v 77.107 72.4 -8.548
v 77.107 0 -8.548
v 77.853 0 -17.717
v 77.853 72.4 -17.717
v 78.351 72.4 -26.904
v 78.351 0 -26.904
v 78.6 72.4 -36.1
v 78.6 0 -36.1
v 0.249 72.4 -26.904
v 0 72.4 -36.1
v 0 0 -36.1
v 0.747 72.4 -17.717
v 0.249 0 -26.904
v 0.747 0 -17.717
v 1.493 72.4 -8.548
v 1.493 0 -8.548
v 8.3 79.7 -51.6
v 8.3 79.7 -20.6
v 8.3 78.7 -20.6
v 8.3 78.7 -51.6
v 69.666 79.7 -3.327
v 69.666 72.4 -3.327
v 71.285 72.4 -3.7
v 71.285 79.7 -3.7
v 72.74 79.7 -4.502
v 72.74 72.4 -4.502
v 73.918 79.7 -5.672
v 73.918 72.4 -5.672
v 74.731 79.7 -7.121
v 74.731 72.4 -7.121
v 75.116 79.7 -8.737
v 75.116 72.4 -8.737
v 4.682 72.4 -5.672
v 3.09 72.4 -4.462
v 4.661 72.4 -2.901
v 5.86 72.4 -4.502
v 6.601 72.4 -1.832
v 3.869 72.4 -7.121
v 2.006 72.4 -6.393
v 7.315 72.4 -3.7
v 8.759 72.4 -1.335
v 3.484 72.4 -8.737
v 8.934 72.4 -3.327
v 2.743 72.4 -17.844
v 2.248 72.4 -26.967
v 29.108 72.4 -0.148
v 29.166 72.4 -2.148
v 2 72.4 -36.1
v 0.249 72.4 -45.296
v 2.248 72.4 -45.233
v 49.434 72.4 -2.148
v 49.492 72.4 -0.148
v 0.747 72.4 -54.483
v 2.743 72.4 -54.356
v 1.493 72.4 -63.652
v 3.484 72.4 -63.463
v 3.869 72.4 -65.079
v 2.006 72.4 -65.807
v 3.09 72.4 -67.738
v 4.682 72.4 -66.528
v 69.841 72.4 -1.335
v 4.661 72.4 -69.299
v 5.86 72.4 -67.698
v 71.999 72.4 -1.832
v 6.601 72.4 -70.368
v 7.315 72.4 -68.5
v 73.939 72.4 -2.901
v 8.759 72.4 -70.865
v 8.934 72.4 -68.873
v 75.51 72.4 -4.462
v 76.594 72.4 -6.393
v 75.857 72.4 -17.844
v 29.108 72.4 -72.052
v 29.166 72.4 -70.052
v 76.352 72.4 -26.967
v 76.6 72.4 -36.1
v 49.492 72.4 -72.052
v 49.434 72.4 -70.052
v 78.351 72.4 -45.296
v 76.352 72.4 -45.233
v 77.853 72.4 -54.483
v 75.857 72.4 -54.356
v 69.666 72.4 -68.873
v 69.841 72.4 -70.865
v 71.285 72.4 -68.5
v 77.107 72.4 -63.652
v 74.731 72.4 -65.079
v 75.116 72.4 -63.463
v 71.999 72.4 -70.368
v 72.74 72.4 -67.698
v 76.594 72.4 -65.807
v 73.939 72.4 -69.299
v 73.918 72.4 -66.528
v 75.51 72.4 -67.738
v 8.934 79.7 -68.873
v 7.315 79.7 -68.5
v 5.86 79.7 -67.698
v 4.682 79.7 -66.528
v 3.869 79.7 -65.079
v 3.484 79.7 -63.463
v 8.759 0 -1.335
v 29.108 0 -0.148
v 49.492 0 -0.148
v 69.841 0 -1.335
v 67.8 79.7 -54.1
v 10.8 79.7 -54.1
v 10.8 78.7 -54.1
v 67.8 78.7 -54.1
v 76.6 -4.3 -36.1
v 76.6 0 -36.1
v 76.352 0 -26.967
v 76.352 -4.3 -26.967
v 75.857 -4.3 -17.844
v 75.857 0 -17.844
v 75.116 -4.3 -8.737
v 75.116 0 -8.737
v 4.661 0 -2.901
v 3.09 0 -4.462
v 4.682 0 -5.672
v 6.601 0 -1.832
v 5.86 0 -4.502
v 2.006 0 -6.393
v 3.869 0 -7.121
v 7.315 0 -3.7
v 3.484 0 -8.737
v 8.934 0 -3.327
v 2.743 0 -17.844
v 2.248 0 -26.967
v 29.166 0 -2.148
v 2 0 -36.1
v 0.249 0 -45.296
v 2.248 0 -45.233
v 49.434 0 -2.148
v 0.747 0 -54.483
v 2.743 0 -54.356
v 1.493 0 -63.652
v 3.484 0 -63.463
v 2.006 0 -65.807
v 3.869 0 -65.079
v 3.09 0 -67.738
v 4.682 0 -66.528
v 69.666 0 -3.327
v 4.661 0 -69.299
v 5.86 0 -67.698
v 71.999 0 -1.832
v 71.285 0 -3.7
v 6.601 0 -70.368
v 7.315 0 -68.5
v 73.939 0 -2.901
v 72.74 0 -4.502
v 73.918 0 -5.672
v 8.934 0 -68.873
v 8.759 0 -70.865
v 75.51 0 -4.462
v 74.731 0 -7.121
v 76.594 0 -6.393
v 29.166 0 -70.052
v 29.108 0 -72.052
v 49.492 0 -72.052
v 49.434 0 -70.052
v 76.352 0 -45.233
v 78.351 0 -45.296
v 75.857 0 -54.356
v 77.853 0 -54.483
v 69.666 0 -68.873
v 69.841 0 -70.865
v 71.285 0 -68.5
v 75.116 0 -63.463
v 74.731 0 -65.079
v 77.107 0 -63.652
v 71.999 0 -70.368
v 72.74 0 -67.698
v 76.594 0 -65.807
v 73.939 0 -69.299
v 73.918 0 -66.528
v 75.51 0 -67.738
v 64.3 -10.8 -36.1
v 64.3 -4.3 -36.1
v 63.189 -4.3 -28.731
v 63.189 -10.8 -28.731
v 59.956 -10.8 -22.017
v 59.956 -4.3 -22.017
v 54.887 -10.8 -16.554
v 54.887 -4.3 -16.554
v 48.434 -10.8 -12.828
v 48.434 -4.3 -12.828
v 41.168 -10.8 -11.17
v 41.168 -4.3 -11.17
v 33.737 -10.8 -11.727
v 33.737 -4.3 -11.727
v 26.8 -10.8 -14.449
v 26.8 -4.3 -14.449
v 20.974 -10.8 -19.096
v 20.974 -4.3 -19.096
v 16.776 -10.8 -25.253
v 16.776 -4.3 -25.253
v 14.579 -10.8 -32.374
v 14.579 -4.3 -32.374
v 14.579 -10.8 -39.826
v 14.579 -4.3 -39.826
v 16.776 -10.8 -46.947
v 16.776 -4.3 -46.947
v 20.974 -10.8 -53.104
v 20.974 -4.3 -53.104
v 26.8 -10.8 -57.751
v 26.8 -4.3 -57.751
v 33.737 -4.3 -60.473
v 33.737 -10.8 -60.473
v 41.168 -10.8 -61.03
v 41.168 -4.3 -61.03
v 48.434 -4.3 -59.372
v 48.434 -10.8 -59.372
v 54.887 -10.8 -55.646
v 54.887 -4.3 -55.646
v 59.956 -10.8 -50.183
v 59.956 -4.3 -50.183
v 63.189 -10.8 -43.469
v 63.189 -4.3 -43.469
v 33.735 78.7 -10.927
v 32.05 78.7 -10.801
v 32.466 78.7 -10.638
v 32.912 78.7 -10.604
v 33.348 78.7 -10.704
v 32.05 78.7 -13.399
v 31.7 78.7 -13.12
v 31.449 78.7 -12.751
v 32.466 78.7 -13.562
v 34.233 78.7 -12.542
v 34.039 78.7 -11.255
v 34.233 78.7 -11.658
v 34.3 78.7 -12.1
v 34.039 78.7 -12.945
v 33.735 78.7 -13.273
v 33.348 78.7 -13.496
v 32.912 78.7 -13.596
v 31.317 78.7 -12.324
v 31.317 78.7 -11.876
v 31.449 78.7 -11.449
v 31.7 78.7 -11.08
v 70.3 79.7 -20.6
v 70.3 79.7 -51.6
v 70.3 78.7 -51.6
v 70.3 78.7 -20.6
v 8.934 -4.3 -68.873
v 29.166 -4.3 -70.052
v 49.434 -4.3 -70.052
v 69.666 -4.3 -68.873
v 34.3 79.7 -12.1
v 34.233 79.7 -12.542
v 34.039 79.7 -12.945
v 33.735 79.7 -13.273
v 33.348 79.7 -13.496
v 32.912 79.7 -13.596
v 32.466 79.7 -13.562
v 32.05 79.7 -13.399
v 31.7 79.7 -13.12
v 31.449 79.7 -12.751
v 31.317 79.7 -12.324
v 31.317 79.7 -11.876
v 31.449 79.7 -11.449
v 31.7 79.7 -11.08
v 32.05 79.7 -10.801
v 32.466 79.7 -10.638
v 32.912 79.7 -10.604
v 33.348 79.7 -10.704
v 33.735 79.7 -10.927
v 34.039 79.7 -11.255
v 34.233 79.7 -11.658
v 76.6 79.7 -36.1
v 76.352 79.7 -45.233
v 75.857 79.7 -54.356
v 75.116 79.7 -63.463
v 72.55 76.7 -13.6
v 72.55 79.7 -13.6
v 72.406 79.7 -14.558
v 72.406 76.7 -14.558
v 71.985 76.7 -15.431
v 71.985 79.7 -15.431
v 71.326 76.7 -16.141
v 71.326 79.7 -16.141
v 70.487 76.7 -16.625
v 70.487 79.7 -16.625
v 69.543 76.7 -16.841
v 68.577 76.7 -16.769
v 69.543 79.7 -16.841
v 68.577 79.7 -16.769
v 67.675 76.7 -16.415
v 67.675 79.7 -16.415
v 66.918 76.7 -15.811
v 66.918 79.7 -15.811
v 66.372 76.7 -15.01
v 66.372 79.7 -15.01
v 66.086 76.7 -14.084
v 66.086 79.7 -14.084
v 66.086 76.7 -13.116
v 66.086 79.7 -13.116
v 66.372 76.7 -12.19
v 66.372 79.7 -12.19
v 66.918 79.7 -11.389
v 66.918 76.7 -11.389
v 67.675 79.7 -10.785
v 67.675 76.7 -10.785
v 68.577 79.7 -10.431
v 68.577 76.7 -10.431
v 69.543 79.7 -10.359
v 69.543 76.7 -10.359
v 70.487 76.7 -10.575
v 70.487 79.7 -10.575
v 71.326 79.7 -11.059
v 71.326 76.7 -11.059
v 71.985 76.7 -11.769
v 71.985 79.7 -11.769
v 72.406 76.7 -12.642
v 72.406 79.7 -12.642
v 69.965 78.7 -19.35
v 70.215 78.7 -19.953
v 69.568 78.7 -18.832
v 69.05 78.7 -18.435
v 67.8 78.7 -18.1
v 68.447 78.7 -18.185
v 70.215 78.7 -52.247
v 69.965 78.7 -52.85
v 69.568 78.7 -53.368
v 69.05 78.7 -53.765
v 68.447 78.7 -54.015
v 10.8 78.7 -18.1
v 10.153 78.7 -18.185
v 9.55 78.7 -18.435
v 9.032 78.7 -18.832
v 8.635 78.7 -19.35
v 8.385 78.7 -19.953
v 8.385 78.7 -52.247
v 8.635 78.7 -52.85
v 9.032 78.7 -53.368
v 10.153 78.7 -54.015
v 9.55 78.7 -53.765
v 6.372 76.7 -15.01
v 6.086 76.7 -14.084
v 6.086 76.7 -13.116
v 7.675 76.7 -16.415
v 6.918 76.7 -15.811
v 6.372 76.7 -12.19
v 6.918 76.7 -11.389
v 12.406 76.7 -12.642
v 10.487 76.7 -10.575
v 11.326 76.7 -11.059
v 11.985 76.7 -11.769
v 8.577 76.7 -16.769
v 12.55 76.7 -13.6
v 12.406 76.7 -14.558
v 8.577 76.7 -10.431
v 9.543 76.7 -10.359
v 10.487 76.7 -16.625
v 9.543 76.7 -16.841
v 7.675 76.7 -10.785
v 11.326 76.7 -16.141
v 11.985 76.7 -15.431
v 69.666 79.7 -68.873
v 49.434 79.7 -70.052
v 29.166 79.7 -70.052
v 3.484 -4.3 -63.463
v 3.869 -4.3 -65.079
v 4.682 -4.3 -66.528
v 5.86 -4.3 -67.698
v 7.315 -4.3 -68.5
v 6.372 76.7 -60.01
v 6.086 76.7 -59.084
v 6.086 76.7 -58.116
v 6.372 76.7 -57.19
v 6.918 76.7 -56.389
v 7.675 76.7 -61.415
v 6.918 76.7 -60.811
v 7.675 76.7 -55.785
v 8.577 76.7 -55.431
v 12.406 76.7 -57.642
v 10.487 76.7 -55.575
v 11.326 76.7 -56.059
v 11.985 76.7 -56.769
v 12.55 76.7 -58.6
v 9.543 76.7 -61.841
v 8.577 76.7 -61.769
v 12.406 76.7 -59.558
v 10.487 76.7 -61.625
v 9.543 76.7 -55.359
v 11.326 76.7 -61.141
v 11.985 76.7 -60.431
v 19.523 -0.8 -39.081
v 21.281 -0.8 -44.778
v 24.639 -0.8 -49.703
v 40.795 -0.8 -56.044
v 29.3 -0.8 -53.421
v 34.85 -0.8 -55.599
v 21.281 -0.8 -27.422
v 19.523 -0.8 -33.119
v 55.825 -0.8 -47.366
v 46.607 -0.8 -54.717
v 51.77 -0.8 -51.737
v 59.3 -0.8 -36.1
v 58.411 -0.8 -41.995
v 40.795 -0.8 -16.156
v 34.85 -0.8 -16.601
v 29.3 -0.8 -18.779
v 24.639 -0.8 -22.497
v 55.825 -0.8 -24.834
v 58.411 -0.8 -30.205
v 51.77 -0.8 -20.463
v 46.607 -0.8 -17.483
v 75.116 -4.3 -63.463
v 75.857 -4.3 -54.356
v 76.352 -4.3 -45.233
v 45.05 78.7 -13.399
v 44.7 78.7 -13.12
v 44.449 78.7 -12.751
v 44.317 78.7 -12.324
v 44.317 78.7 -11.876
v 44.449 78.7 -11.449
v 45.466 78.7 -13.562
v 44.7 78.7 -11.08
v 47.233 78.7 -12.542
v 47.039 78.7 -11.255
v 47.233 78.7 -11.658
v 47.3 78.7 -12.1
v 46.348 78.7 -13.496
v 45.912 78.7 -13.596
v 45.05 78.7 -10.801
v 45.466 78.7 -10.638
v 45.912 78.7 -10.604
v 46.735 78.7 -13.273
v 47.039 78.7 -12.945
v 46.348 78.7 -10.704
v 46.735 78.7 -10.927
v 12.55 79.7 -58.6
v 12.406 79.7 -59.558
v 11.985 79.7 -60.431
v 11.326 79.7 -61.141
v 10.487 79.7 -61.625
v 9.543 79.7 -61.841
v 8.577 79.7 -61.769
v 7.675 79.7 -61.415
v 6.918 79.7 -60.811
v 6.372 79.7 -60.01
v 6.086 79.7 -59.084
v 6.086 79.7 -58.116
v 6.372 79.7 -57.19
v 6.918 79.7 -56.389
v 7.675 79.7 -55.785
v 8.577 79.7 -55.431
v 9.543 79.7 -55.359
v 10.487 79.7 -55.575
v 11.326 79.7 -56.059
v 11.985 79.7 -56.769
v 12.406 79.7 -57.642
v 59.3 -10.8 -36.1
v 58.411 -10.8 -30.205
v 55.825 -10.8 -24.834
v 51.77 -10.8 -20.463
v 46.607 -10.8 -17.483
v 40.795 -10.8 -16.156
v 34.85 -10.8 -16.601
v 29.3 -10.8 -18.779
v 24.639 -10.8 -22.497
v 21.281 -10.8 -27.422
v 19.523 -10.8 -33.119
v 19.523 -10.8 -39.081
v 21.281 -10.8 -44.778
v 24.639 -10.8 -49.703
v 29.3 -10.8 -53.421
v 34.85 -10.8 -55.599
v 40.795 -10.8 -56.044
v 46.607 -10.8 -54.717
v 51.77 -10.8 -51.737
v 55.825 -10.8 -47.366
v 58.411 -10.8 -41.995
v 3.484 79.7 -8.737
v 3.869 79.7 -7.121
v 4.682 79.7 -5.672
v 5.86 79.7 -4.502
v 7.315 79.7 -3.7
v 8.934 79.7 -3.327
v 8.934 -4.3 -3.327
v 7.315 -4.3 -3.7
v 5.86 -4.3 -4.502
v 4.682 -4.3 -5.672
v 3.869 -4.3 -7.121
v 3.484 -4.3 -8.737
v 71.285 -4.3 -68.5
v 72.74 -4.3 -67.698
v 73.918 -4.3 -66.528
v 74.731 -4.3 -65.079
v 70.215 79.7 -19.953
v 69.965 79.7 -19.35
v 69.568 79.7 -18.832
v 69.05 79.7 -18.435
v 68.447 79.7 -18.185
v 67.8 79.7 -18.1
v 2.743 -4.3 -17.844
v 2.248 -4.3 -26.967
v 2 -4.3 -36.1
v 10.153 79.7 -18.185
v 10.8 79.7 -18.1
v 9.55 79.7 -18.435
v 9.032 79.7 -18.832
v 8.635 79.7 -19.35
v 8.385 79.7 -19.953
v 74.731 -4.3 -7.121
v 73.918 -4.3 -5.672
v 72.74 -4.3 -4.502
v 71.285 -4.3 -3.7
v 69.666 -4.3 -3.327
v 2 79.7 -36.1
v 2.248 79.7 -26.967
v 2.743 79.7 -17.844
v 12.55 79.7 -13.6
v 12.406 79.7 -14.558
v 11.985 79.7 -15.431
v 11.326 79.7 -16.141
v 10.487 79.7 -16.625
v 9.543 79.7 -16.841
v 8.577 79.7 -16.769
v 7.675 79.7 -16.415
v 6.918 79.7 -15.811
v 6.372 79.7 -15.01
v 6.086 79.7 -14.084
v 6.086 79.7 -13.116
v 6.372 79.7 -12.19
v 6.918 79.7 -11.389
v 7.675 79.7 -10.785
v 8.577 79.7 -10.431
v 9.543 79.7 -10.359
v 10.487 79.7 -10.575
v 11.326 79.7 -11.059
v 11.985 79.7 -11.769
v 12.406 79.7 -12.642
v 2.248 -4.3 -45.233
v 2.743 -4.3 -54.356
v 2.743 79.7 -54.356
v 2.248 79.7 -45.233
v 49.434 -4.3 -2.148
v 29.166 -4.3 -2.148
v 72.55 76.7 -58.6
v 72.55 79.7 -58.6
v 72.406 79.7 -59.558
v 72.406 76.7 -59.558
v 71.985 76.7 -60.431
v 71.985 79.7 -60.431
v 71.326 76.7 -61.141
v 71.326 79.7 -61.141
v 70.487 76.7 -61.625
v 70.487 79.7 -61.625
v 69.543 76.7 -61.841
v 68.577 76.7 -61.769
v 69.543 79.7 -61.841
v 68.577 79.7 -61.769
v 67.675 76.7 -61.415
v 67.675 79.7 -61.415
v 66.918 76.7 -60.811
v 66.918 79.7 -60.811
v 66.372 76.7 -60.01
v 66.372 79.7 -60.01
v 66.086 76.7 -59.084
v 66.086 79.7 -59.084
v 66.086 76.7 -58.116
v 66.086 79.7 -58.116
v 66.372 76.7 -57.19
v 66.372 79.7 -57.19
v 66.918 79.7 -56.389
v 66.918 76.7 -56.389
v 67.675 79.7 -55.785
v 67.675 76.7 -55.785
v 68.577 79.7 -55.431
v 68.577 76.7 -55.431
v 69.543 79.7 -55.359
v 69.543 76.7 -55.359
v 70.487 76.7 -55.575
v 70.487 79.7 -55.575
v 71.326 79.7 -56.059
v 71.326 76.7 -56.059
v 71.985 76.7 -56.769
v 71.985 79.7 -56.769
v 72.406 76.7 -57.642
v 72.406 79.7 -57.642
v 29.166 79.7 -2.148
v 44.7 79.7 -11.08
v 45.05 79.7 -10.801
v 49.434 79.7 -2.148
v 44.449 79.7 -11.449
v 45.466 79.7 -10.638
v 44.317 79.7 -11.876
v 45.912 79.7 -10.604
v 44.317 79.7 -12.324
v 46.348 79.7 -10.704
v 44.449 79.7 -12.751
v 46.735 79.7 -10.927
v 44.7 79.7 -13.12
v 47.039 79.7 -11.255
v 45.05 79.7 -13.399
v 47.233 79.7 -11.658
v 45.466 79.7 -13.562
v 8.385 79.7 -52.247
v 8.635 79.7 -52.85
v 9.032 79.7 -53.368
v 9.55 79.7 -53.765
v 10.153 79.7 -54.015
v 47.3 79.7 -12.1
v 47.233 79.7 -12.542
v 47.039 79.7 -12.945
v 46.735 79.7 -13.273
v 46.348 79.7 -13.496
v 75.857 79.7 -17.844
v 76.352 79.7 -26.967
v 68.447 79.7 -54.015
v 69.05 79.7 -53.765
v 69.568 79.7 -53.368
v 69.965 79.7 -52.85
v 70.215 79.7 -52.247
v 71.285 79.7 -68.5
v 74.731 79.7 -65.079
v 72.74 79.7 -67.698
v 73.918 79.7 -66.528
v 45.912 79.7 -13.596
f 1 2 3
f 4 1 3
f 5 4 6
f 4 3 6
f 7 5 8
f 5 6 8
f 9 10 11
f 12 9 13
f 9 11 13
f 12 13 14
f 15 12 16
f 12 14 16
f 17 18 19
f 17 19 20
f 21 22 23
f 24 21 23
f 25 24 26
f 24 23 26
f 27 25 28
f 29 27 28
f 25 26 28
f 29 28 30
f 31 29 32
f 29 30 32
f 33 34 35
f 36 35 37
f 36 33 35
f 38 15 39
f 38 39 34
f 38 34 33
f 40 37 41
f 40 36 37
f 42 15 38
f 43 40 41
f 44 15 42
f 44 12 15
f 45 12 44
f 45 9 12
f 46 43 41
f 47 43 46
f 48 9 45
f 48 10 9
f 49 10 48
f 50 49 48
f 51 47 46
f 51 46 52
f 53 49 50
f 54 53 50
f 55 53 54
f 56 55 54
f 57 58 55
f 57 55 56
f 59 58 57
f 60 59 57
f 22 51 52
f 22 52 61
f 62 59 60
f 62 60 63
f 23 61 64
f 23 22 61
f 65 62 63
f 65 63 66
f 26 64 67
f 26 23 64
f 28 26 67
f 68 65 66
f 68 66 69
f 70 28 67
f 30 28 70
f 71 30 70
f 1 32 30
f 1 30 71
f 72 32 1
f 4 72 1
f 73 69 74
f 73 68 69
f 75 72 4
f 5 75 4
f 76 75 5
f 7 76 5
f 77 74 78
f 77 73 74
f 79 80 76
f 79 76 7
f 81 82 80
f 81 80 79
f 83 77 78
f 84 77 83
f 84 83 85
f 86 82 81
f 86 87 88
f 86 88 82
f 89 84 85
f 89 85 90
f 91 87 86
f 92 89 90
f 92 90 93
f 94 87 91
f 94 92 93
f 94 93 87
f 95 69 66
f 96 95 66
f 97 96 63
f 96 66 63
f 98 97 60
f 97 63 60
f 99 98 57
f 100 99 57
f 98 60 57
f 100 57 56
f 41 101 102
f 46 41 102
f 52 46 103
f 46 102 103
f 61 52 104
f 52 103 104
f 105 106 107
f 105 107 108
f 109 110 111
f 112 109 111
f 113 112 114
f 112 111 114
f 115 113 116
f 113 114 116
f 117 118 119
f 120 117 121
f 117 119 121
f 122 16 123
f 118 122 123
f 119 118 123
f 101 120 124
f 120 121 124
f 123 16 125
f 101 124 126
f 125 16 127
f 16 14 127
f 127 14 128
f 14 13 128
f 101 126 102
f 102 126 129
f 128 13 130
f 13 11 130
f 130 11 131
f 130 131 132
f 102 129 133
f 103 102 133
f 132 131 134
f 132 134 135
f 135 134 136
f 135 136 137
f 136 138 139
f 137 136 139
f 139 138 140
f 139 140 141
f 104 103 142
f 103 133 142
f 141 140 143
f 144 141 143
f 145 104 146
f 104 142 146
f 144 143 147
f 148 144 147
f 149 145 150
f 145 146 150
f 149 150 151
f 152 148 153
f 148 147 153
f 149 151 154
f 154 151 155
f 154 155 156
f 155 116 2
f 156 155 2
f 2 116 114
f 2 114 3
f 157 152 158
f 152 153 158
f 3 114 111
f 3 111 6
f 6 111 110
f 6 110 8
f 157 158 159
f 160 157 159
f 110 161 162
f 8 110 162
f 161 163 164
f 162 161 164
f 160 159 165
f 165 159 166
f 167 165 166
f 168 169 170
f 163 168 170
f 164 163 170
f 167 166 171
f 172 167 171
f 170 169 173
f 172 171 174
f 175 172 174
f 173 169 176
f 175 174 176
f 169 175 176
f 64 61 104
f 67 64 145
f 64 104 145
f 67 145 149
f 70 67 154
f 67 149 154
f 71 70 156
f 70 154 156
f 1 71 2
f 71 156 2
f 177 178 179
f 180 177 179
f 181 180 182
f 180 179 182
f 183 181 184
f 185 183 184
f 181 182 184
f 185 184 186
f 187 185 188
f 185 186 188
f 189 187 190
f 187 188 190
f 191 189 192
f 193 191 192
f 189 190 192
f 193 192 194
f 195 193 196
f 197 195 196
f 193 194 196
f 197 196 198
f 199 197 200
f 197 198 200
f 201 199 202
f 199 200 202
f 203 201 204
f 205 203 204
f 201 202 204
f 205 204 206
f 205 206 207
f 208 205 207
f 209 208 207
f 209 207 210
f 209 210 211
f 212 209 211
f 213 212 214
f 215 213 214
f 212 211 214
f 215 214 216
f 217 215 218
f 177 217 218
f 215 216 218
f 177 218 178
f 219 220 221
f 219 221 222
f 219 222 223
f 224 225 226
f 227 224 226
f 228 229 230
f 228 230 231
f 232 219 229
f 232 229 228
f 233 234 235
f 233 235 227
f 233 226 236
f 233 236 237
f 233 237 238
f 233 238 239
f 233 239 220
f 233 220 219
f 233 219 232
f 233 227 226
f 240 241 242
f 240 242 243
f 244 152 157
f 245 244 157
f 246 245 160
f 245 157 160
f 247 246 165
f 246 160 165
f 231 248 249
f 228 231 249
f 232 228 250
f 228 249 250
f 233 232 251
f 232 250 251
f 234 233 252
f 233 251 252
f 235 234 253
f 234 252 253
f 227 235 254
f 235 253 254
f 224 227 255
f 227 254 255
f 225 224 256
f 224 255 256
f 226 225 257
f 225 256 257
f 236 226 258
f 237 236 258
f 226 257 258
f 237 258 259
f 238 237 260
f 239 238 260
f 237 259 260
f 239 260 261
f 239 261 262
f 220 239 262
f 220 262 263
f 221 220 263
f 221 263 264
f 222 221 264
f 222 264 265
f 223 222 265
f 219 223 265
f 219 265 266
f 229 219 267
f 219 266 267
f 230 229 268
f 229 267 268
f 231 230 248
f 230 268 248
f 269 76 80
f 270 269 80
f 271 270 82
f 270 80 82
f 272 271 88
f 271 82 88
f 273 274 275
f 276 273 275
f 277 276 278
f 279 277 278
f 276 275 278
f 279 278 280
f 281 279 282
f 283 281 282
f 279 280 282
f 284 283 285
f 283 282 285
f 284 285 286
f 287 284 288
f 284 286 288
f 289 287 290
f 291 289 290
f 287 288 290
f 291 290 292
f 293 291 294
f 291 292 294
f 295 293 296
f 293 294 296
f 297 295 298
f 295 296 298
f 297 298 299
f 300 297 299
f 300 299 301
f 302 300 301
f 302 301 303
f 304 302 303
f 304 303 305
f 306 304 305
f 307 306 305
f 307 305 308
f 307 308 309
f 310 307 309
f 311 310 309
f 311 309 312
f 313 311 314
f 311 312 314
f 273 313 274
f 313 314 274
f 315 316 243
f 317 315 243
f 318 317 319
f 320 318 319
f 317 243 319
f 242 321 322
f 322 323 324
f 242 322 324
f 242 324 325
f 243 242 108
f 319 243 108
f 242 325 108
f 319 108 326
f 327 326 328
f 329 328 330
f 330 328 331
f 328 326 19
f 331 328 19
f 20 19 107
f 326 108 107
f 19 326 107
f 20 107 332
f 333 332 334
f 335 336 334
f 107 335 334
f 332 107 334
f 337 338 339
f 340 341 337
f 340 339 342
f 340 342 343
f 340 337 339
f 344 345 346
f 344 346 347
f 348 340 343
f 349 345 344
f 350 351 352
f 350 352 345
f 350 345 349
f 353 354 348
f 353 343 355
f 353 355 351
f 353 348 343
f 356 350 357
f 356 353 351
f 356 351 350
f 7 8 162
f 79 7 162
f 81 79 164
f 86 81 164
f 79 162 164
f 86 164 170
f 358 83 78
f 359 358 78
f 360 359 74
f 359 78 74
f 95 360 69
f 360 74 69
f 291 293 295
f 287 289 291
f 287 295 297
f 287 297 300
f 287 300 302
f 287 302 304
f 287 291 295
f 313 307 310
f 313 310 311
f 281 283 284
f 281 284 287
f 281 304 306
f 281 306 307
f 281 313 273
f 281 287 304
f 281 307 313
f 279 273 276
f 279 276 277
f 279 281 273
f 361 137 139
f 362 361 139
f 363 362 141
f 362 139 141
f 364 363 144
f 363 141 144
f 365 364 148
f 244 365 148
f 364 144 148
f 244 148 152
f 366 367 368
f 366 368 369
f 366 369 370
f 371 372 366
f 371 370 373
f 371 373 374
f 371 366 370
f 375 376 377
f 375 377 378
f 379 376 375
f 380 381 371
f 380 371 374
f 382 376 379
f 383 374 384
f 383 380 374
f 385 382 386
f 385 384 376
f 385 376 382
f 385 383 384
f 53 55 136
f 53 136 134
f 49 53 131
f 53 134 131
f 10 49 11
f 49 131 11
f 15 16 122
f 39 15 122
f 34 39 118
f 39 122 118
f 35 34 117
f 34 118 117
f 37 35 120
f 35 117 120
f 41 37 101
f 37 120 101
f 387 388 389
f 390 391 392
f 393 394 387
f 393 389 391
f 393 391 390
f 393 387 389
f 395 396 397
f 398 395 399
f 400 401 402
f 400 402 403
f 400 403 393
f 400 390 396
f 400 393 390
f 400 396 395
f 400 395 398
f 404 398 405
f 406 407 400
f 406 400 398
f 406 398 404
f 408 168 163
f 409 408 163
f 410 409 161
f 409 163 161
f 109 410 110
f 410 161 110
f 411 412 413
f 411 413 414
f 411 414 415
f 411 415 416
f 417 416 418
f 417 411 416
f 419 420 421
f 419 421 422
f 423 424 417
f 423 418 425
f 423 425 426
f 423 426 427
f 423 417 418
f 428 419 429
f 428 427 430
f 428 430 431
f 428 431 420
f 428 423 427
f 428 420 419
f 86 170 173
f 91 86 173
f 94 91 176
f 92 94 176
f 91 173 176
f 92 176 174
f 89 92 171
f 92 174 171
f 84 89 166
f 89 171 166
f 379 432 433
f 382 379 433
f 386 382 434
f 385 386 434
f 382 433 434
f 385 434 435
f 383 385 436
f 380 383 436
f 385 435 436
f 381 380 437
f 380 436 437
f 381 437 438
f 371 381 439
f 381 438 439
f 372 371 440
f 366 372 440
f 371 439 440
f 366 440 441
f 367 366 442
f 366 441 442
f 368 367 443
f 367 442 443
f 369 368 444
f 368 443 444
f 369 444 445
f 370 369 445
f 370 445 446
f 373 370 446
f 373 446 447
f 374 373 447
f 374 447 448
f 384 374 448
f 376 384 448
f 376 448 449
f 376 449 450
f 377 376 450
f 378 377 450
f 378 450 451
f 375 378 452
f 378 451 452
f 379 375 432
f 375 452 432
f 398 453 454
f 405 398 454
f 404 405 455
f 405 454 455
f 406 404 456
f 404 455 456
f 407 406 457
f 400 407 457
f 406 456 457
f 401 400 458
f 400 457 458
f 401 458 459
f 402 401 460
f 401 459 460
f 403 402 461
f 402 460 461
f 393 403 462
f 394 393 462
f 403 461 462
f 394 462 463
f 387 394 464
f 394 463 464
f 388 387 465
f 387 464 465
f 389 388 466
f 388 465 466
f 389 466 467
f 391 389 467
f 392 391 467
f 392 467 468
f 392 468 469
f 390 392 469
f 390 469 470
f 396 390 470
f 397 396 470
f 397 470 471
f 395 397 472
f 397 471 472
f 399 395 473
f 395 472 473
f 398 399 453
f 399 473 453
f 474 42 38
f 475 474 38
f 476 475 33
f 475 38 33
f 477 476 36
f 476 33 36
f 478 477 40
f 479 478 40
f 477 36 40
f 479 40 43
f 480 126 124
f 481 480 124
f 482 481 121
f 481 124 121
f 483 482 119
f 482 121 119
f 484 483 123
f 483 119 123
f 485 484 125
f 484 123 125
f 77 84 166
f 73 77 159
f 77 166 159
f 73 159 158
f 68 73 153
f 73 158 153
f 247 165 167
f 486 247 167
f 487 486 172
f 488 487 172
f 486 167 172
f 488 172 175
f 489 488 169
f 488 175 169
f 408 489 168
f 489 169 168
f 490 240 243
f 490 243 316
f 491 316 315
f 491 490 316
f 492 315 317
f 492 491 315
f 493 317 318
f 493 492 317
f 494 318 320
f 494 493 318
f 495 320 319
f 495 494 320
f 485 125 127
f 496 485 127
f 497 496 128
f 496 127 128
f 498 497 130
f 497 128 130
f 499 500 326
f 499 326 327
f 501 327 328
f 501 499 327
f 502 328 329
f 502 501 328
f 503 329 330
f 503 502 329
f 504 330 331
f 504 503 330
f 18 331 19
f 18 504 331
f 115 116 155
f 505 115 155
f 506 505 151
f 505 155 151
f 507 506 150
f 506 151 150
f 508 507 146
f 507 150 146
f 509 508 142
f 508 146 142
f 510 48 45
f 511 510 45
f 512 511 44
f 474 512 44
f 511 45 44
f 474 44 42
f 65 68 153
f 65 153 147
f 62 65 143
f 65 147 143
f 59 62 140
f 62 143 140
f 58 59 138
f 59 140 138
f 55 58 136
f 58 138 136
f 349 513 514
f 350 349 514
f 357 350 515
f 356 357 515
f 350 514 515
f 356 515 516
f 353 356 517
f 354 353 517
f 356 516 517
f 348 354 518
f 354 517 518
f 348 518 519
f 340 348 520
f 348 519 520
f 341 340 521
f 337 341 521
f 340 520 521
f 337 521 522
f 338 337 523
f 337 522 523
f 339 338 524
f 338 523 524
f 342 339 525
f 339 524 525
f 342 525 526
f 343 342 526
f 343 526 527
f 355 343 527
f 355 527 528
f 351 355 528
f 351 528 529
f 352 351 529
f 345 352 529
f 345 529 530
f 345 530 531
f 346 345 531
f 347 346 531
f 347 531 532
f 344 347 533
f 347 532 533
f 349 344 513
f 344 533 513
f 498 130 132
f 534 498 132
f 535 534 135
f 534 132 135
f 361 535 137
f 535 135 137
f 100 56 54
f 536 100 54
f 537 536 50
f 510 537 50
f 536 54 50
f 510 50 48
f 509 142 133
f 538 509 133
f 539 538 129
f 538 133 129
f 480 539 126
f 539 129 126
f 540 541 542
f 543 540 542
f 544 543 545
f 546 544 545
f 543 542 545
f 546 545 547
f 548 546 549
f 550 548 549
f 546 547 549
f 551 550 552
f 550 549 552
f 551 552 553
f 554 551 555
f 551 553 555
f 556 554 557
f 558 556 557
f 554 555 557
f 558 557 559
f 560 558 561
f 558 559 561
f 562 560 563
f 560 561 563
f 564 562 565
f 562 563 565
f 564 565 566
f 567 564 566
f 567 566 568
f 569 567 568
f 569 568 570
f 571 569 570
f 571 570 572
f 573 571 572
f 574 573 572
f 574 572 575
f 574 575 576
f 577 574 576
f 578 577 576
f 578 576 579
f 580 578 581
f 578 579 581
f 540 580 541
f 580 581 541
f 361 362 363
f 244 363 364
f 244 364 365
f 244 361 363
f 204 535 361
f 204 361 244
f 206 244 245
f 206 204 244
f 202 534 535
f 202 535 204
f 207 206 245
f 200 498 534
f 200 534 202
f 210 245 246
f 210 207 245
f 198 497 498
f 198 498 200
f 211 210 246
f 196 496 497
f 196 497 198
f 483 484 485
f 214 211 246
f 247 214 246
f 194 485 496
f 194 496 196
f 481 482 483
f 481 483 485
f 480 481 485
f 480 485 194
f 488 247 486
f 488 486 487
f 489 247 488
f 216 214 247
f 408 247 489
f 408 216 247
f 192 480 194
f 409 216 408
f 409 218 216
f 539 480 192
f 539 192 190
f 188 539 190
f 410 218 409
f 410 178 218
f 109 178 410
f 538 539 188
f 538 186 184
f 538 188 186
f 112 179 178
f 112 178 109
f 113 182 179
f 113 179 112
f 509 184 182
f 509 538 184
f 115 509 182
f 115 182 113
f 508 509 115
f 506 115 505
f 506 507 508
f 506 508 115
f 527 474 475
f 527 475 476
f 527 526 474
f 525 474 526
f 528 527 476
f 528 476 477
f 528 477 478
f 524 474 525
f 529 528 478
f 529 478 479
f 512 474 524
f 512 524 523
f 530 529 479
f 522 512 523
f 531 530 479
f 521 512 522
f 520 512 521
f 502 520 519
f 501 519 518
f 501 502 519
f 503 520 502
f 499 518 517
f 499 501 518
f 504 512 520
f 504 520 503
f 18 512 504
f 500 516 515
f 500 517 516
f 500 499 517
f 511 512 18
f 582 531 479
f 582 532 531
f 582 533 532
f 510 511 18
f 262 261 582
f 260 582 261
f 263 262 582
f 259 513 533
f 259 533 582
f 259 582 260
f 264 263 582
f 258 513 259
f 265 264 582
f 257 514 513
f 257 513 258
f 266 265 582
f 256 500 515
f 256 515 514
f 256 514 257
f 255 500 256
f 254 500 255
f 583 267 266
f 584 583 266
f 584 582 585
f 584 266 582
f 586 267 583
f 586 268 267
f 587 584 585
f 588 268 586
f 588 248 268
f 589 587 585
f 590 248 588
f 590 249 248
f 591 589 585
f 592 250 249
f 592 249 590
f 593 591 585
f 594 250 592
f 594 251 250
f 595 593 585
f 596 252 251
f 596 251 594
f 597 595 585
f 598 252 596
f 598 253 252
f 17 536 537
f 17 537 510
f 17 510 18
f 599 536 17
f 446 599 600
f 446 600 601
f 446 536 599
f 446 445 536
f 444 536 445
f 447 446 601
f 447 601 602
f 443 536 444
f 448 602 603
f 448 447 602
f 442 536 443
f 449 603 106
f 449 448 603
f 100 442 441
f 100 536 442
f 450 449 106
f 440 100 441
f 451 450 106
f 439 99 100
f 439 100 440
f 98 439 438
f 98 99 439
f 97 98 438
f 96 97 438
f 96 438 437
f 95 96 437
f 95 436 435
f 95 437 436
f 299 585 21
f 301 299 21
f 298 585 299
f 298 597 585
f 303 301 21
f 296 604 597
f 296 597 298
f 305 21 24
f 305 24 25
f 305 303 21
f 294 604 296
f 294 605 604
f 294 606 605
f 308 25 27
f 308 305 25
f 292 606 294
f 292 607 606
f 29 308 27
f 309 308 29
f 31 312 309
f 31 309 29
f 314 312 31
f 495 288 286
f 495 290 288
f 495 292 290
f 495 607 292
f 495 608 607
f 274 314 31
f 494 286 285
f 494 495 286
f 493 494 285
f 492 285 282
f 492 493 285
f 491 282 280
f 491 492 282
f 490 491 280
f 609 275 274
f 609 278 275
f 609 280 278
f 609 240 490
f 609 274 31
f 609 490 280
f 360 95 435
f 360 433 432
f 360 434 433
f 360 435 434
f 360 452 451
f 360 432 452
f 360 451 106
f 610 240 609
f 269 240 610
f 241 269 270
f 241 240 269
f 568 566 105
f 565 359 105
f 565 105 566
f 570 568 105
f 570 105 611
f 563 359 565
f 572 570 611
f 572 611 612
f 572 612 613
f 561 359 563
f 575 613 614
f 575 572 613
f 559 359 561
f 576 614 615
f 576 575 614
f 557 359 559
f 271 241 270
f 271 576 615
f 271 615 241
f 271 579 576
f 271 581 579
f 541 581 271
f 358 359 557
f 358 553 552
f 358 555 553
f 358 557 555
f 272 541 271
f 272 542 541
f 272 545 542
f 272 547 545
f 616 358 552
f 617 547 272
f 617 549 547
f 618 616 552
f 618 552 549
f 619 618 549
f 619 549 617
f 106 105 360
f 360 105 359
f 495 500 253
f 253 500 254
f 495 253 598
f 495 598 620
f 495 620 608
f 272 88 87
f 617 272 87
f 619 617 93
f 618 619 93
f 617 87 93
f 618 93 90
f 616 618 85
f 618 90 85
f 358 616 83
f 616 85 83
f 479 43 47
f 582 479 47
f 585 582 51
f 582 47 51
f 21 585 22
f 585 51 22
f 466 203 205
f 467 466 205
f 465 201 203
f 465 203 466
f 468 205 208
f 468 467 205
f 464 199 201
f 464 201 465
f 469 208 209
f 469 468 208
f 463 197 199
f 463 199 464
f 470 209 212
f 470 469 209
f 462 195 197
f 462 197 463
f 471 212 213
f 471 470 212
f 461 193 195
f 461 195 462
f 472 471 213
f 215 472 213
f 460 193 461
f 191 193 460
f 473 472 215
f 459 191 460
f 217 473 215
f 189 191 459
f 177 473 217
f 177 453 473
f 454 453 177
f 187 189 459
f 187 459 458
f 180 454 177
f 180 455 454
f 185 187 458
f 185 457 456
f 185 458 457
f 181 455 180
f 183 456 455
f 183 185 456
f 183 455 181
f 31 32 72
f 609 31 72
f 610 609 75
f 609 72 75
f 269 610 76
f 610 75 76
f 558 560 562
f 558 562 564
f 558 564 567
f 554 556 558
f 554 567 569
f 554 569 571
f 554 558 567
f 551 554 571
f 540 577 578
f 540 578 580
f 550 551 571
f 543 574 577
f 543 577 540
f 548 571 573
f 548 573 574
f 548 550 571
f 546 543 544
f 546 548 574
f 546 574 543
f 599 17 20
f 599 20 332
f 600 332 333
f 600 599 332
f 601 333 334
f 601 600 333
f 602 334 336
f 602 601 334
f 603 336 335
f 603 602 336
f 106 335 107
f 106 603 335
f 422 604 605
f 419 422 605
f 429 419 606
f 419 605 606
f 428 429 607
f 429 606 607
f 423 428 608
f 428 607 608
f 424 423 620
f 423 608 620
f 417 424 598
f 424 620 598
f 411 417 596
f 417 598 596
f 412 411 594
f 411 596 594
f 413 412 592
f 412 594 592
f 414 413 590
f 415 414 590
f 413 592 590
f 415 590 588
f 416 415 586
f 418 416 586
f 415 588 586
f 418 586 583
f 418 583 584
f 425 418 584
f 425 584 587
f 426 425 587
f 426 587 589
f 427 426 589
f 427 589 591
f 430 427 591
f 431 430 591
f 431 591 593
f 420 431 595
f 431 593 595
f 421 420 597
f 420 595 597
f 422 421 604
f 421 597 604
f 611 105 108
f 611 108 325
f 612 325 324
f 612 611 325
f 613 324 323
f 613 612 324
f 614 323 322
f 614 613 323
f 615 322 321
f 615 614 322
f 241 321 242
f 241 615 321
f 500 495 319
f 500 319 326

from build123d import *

# Parameters (mm, degrees)
BOSS_EXTRUDE1_DEPTH = 72.4
BOSS_EXTRUDE2_DEPTH = 7.3
BOSS_EXTRUDE3_DEPTH = 4.3
SKETCH4_R           = 25
BOSS_EXTRUDE4_DEPTH = 6.5
SKETCH5_R           = 3.25
CUT_EXTRUDE1_DEPTH  = 3
CUT_EXTRUDE2_DEPTH  = 1
SKETCH7_R           = 1.5
CUT_EXTRUDE3_DEPTH  = 1
SKETCH8_R           = 20
CUT_EXTRUDE4_DEPTH  = 10


with BuildPart() as part:
    # Sketch1 → Boss-Extrude1 (new body)
    with BuildSketch(Plane(origin=(0, 0, 0), x_dir=(1, 0, 0), z_dir=(0, 1, 0))):
        with BuildLine():
            ThreePointArc((69.840771002, 70.864970002), (39.3, 72.2), (8.759228998, 70.864970002))
            ThreePointArc((8.759228998, 70.864970002), (3.821292476, 68.573105669), (1.493169033, 63.652160592))
            ThreePointArc((1.493169033, 63.652160592), (0.466996736, 49.89123235), (0, 36.1))
            ThreePointArc((0, 36.1), (0.466996736, 22.30876765), (1.493169033, 8.547839408))
            ThreePointArc((1.493169033, 8.547839408), (3.821292476, 3.626894331), (8.759228998, 1.335029998))
            ThreePointArc((8.759228998, 1.335029998), (39.3, 0), (69.840771002, 1.335029998))
            ThreePointArc((69.840771002, 1.335029998), (74.778707524, 3.626894331), (77.106830967, 8.547839408))
            ThreePointArc((77.106830967, 8.547839408), (78.133003264, 22.30876765), (78.6, 36.1))
            ThreePointArc((78.6, 36.1), (78.133003264, 49.89123235), (77.106830967, 63.652160592))
            ThreePointArc((77.106830967, 63.652160592), (74.778707524, 68.573105669), (69.840771002, 70.864970002))
        make_face()
    extrude(amount=BOSS_EXTRUDE1_DEPTH)

    # Sketch2 → Boss-Extrude2 (add)
    with BuildSketch(Plane(origin=(0, 72.4, 0), x_dir=(1, 0, 0), z_dir=(0, 1, 0))):
        with BuildLine():
            ThreePointArc((69.66625231, 68.872598745), (39.3, 70.2), (8.93374769, 68.872598745))
            ThreePointArc((8.93374769, 68.872598745), (5.230295298, 67.153700495), (3.484202716, 63.462991687))
            ThreePointArc((3.484202716, 63.462991687), (2.464800099, 49.796540149), (2.000184882, 36.1))
            ThreePointArc((2.000184882, 36.1), (2.464800099, 22.403459851), (3.484202716, 8.737008313))
            ThreePointArc((3.484202716, 8.737008313), (5.230295298, 5.046299505), (8.93374769, 3.327401255))
            ThreePointArc((8.93374769, 3.327401255), (39.3, 2), (69.66625231, 3.327401255))
            ThreePointArc((69.66625231, 3.327401255), (73.369704702, 5.046299505), (75.115797284, 8.737008313))
            ThreePointArc((75.115797284, 8.737008313), (76.135199901, 22.403459851), (76.599815118, 36.1))
            ThreePointArc((76.599815118, 36.1), (76.135199901, 49.796540149), (75.115797284, 63.462991687))
            ThreePointArc((75.115797284, 63.462991687), (73.369704702, 67.153700495), (69.66625231, 68.872598745))
        make_face()
    extrude(amount=BOSS_EXTRUDE2_DEPTH)

    # Sketch3 → Boss-Extrude3 (add)
    with BuildSketch(Plane.XZ):
        with BuildLine():
            ThreePointArc((69.66625231, -3.327401255), (39.3, -2), (8.93374769, -3.327401255))
            ThreePointArc((8.93374769, -3.327401255), (5.230295298, -5.046299505), (3.484202716, -8.737008313))
            ThreePointArc((3.484202716, -8.737008313), (2.464800099, -22.403459851), (2.000184882, -36.1))
            ThreePointArc((2.000184882, -36.1), (2.464800099, -49.796540149), (3.484202716, -63.462991687))
            ThreePointArc((3.484202716, -63.462991687), (5.230295298, -67.153700495), (8.93374769, -68.872598745))
            ThreePointArc((8.93374769, -68.872598745), (39.3, -70.2), (69.66625231, -68.872598745))
            ThreePointArc((69.66625231, -68.872598745), (73.369704702, -67.153700495), (75.115797284, -63.462991687))
            ThreePointArc((75.115797284, -63.462991687), (76.135199901, -49.796540149), (76.599815118, -36.1))
            ThreePointArc((76.599815118, -36.1), (76.135199901, -22.403459851), (75.115797284, -8.737008313))
            ThreePointArc((75.115797284, -8.737008313), (73.369704702, -5.046299505), (69.66625231, -3.327401255))
        make_face()
    extrude(amount=BOSS_EXTRUDE3_DEPTH)

    # Sketch4 → Boss-Extrude4 (add)
    with BuildSketch(Plane.XZ.offset(4.3)):
        with Locations((39.3, -36.1)):
            Circle(SKETCH4_R)
    extrude(amount=BOSS_EXTRUDE4_DEPTH)

    # Sketch5 → Cut-Extrude1 (cut)
    with BuildSketch(Plane(origin=(0, 79.7, 0), x_dir=(1, 0, 0), z_dir=(0, 1, 0))):
        with Locations((69.3, 58.6)):
            Circle(SKETCH5_R)
        with Locations((69.3, 13.6)):
            Circle(SKETCH5_R)
        with Locations((9.3, 13.6)):
            Circle(SKETCH5_R)
        with Locations((9.3, 58.6)):
            Circle(SKETCH5_R)
    extrude(amount=-CUT_EXTRUDE1_DEPTH, mode=Mode.SUBTRACT)

    # Sketch6 → Cut-Extrude2 (cut)
    with BuildSketch(Plane(origin=(0, 79.7, 0), x_dir=(1, 0, 0), z_dir=(0, 1, 0))):
        with BuildLine():
            Line((10.8, 54.1), (67.8, 54.1))
            ThreePointArc((67.8, 54.1), (69.567766953, 53.367766953), (70.3, 51.6))
            Line((70.3, 51.6), (70.3, 20.6))
            ThreePointArc((70.3, 20.6), (69.567766953, 18.832233047), (67.8, 18.1))
            Line((67.8, 18.1), (10.8, 18.1))
            ThreePointArc((10.8, 18.1), (9.032233047, 18.832233047), (8.3, 20.6))
            Line((8.3, 20.6), (8.3, 51.6))
            ThreePointArc((8.3, 51.6), (9.032233047, 53.367766953), (10.8, 54.1))
        make_face()
    extrude(amount=-CUT_EXTRUDE2_DEPTH, mode=Mode.SUBTRACT)

    # Sketch7 → Cut-Extrude3 (cut)
    with BuildSketch(Plane(origin=(0, 79.7, 0), x_dir=(1, 0, 0), z_dir=(0, 1, 0))):
        with Locations((32.8, 12.1)):
            Circle(SKETCH7_R)
        with Locations((45.8, 12.1)):
            Circle(SKETCH7_R)
    extrude(amount=-CUT_EXTRUDE3_DEPTH, mode=Mode.SUBTRACT)

    # Sketch8 → Cut-Extrude4 (cut)
    with BuildSketch(Plane.XZ.offset(10.8)):
        with Locations((39.3, -36.1)):
            Circle(SKETCH8_R)
    extrude(amount=-CUT_EXTRUDE4_DEPTH, mode=Mode.SUBTRACT)


solid = part.part
